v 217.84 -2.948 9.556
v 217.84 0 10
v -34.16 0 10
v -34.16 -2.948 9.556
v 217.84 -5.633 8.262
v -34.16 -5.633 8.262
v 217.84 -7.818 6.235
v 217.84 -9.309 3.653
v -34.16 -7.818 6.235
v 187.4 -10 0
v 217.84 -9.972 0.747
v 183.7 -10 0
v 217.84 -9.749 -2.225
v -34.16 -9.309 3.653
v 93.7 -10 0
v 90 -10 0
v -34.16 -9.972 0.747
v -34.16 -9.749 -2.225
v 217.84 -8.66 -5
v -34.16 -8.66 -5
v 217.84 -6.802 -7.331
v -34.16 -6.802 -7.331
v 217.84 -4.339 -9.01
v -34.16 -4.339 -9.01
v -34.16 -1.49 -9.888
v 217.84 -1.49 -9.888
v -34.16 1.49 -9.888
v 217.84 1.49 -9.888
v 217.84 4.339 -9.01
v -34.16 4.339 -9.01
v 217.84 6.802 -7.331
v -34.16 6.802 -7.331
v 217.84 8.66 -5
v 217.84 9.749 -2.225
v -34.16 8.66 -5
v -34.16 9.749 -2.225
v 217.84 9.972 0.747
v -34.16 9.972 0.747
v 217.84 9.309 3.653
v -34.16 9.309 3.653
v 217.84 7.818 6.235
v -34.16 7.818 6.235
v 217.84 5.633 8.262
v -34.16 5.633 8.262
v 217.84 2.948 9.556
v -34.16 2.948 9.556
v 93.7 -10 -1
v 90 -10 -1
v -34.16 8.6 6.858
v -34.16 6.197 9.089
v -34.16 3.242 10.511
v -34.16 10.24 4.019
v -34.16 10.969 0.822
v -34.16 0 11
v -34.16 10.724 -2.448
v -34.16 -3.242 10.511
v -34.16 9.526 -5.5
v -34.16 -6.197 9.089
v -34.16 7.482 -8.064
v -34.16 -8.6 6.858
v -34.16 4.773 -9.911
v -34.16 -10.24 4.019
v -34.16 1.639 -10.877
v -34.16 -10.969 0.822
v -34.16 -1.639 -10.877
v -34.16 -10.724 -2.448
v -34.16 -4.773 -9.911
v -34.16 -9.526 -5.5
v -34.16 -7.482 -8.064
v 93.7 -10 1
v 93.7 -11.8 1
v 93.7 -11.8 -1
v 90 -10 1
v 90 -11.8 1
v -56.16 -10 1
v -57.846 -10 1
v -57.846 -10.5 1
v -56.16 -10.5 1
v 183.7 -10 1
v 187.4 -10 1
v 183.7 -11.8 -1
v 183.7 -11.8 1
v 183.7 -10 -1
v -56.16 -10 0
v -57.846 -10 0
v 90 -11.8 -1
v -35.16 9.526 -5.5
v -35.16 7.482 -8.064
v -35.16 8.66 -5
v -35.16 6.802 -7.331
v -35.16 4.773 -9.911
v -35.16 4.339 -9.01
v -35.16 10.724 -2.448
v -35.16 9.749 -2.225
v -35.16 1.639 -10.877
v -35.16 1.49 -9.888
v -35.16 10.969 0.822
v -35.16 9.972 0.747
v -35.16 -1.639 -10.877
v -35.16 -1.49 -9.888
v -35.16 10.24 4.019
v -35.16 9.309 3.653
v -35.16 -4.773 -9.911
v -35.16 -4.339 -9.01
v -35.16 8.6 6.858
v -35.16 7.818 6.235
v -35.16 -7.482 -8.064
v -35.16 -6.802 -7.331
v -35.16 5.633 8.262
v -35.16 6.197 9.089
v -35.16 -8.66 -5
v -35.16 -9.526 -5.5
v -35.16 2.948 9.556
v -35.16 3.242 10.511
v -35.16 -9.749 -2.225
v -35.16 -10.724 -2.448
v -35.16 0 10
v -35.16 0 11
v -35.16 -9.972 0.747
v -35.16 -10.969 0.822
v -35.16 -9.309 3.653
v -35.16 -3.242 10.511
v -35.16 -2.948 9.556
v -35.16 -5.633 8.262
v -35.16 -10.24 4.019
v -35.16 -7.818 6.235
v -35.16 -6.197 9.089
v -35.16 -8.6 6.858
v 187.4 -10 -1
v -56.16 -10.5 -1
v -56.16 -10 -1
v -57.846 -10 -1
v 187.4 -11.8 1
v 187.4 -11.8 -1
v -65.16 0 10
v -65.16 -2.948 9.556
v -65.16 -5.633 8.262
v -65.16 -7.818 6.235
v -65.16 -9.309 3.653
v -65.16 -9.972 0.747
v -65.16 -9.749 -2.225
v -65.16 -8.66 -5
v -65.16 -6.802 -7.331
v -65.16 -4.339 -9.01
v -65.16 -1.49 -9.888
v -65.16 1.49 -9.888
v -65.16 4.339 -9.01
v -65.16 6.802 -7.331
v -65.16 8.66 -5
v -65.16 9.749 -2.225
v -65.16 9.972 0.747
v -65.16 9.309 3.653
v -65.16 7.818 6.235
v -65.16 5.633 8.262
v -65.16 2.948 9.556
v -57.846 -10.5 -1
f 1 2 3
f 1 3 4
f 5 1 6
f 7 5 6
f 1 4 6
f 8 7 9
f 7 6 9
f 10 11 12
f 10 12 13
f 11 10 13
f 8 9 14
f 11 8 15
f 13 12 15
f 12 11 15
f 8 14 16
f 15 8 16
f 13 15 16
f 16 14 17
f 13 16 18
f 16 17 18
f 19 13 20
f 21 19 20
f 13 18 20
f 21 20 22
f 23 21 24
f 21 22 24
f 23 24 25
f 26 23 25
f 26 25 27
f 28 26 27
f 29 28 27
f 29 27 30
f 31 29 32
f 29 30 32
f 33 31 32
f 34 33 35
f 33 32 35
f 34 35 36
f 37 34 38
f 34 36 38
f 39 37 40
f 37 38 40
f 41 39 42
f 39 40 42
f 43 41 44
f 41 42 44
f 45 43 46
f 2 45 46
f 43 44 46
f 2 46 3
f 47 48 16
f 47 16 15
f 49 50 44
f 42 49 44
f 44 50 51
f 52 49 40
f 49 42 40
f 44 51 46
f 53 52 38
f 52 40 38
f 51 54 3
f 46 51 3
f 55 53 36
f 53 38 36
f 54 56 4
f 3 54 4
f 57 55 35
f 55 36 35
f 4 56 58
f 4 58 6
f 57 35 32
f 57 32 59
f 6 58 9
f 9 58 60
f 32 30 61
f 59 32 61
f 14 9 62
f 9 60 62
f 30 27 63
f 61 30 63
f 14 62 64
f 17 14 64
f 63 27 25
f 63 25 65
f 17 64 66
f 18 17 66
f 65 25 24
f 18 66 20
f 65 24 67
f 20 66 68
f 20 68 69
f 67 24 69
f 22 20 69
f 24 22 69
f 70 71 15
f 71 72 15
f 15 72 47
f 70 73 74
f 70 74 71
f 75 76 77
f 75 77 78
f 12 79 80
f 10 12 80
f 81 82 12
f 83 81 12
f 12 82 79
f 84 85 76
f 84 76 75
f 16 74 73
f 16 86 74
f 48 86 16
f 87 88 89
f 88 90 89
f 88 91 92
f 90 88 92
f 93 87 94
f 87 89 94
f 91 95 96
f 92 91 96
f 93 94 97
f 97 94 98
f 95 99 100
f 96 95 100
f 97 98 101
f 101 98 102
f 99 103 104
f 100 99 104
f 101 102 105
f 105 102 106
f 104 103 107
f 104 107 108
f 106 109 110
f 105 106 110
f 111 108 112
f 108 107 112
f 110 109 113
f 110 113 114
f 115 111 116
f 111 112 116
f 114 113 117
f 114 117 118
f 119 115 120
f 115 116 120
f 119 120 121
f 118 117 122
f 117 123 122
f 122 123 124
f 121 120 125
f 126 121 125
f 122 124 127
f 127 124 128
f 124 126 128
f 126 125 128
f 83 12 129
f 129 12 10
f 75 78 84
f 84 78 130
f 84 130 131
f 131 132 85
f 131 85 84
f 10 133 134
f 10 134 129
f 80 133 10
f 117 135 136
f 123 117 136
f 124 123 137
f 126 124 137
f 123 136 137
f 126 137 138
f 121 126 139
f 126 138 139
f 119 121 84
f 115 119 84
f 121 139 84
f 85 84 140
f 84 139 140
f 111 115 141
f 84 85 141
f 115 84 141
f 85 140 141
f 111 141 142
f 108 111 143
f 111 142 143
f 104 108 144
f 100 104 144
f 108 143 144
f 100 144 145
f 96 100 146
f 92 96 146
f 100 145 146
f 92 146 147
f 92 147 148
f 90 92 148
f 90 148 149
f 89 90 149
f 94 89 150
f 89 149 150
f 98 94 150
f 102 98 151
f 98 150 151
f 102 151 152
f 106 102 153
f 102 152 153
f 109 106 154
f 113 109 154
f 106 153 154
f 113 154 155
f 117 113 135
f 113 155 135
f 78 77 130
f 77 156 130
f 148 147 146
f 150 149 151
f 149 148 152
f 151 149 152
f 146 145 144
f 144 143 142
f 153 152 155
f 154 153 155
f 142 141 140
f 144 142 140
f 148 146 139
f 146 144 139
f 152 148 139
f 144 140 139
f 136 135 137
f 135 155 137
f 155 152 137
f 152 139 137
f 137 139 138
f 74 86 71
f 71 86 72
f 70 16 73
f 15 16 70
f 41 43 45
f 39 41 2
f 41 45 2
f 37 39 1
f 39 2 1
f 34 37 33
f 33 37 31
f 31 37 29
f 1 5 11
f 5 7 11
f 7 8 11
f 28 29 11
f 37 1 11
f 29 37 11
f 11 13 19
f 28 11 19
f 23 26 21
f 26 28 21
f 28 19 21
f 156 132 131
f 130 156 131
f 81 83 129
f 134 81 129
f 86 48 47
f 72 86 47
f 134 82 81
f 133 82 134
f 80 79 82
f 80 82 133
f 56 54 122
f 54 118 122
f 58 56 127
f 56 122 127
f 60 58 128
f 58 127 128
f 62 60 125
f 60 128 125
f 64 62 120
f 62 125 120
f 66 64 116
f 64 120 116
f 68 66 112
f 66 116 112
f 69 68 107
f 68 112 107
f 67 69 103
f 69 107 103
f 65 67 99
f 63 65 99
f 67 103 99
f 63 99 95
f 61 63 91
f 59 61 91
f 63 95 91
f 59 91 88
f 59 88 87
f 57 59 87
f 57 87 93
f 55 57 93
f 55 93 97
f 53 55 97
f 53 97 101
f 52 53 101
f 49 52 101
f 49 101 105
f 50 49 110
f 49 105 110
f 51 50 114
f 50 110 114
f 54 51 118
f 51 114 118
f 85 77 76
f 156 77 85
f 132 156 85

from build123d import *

# Parameters (mm, degrees)
F2_W     = 1.6857574282
F2_H     = 0.5
F2_W_2   = 3.7
F2_H_2   = 1.8
F3_DEPTH = 1


with BuildPart() as f1:
    # F0 (on Front) → F1 (revolve)
    with BuildSketch(Plane.XZ):
        Polygon((67.8396956921, 10), (-34.1603043079, 10), (-34.1603043079, 11), (-35.1603043079, 11), (-35.1603043079, 10), (-65.1603043079, 10), (-65.1603043079, 0), (0, 0), (102, 0), (217.8396956921, 0), (217.8396956921, 10), (176.3, 10), (86.3, 10), align=None)
    revolve(axis=Axis((-32.580152154, 0, 0), (1, 0, 0)))

    # F2 (on Top) → F3 (join, symmetric)
    with BuildSketch(Plane.XY):
        with Locations((-57.0031830221, -10.25)):
            Rectangle(F2_W, F2_H)
        with Locations((91.85, -10.9)):
            Rectangle(F2_W_2, F2_H_2)
        with Locations((185.55, -10.9)):
            Rectangle(F2_W_2, F2_H_2)
    extrude(amount=F3_DEPTH, both=True)


solid = f1.part
